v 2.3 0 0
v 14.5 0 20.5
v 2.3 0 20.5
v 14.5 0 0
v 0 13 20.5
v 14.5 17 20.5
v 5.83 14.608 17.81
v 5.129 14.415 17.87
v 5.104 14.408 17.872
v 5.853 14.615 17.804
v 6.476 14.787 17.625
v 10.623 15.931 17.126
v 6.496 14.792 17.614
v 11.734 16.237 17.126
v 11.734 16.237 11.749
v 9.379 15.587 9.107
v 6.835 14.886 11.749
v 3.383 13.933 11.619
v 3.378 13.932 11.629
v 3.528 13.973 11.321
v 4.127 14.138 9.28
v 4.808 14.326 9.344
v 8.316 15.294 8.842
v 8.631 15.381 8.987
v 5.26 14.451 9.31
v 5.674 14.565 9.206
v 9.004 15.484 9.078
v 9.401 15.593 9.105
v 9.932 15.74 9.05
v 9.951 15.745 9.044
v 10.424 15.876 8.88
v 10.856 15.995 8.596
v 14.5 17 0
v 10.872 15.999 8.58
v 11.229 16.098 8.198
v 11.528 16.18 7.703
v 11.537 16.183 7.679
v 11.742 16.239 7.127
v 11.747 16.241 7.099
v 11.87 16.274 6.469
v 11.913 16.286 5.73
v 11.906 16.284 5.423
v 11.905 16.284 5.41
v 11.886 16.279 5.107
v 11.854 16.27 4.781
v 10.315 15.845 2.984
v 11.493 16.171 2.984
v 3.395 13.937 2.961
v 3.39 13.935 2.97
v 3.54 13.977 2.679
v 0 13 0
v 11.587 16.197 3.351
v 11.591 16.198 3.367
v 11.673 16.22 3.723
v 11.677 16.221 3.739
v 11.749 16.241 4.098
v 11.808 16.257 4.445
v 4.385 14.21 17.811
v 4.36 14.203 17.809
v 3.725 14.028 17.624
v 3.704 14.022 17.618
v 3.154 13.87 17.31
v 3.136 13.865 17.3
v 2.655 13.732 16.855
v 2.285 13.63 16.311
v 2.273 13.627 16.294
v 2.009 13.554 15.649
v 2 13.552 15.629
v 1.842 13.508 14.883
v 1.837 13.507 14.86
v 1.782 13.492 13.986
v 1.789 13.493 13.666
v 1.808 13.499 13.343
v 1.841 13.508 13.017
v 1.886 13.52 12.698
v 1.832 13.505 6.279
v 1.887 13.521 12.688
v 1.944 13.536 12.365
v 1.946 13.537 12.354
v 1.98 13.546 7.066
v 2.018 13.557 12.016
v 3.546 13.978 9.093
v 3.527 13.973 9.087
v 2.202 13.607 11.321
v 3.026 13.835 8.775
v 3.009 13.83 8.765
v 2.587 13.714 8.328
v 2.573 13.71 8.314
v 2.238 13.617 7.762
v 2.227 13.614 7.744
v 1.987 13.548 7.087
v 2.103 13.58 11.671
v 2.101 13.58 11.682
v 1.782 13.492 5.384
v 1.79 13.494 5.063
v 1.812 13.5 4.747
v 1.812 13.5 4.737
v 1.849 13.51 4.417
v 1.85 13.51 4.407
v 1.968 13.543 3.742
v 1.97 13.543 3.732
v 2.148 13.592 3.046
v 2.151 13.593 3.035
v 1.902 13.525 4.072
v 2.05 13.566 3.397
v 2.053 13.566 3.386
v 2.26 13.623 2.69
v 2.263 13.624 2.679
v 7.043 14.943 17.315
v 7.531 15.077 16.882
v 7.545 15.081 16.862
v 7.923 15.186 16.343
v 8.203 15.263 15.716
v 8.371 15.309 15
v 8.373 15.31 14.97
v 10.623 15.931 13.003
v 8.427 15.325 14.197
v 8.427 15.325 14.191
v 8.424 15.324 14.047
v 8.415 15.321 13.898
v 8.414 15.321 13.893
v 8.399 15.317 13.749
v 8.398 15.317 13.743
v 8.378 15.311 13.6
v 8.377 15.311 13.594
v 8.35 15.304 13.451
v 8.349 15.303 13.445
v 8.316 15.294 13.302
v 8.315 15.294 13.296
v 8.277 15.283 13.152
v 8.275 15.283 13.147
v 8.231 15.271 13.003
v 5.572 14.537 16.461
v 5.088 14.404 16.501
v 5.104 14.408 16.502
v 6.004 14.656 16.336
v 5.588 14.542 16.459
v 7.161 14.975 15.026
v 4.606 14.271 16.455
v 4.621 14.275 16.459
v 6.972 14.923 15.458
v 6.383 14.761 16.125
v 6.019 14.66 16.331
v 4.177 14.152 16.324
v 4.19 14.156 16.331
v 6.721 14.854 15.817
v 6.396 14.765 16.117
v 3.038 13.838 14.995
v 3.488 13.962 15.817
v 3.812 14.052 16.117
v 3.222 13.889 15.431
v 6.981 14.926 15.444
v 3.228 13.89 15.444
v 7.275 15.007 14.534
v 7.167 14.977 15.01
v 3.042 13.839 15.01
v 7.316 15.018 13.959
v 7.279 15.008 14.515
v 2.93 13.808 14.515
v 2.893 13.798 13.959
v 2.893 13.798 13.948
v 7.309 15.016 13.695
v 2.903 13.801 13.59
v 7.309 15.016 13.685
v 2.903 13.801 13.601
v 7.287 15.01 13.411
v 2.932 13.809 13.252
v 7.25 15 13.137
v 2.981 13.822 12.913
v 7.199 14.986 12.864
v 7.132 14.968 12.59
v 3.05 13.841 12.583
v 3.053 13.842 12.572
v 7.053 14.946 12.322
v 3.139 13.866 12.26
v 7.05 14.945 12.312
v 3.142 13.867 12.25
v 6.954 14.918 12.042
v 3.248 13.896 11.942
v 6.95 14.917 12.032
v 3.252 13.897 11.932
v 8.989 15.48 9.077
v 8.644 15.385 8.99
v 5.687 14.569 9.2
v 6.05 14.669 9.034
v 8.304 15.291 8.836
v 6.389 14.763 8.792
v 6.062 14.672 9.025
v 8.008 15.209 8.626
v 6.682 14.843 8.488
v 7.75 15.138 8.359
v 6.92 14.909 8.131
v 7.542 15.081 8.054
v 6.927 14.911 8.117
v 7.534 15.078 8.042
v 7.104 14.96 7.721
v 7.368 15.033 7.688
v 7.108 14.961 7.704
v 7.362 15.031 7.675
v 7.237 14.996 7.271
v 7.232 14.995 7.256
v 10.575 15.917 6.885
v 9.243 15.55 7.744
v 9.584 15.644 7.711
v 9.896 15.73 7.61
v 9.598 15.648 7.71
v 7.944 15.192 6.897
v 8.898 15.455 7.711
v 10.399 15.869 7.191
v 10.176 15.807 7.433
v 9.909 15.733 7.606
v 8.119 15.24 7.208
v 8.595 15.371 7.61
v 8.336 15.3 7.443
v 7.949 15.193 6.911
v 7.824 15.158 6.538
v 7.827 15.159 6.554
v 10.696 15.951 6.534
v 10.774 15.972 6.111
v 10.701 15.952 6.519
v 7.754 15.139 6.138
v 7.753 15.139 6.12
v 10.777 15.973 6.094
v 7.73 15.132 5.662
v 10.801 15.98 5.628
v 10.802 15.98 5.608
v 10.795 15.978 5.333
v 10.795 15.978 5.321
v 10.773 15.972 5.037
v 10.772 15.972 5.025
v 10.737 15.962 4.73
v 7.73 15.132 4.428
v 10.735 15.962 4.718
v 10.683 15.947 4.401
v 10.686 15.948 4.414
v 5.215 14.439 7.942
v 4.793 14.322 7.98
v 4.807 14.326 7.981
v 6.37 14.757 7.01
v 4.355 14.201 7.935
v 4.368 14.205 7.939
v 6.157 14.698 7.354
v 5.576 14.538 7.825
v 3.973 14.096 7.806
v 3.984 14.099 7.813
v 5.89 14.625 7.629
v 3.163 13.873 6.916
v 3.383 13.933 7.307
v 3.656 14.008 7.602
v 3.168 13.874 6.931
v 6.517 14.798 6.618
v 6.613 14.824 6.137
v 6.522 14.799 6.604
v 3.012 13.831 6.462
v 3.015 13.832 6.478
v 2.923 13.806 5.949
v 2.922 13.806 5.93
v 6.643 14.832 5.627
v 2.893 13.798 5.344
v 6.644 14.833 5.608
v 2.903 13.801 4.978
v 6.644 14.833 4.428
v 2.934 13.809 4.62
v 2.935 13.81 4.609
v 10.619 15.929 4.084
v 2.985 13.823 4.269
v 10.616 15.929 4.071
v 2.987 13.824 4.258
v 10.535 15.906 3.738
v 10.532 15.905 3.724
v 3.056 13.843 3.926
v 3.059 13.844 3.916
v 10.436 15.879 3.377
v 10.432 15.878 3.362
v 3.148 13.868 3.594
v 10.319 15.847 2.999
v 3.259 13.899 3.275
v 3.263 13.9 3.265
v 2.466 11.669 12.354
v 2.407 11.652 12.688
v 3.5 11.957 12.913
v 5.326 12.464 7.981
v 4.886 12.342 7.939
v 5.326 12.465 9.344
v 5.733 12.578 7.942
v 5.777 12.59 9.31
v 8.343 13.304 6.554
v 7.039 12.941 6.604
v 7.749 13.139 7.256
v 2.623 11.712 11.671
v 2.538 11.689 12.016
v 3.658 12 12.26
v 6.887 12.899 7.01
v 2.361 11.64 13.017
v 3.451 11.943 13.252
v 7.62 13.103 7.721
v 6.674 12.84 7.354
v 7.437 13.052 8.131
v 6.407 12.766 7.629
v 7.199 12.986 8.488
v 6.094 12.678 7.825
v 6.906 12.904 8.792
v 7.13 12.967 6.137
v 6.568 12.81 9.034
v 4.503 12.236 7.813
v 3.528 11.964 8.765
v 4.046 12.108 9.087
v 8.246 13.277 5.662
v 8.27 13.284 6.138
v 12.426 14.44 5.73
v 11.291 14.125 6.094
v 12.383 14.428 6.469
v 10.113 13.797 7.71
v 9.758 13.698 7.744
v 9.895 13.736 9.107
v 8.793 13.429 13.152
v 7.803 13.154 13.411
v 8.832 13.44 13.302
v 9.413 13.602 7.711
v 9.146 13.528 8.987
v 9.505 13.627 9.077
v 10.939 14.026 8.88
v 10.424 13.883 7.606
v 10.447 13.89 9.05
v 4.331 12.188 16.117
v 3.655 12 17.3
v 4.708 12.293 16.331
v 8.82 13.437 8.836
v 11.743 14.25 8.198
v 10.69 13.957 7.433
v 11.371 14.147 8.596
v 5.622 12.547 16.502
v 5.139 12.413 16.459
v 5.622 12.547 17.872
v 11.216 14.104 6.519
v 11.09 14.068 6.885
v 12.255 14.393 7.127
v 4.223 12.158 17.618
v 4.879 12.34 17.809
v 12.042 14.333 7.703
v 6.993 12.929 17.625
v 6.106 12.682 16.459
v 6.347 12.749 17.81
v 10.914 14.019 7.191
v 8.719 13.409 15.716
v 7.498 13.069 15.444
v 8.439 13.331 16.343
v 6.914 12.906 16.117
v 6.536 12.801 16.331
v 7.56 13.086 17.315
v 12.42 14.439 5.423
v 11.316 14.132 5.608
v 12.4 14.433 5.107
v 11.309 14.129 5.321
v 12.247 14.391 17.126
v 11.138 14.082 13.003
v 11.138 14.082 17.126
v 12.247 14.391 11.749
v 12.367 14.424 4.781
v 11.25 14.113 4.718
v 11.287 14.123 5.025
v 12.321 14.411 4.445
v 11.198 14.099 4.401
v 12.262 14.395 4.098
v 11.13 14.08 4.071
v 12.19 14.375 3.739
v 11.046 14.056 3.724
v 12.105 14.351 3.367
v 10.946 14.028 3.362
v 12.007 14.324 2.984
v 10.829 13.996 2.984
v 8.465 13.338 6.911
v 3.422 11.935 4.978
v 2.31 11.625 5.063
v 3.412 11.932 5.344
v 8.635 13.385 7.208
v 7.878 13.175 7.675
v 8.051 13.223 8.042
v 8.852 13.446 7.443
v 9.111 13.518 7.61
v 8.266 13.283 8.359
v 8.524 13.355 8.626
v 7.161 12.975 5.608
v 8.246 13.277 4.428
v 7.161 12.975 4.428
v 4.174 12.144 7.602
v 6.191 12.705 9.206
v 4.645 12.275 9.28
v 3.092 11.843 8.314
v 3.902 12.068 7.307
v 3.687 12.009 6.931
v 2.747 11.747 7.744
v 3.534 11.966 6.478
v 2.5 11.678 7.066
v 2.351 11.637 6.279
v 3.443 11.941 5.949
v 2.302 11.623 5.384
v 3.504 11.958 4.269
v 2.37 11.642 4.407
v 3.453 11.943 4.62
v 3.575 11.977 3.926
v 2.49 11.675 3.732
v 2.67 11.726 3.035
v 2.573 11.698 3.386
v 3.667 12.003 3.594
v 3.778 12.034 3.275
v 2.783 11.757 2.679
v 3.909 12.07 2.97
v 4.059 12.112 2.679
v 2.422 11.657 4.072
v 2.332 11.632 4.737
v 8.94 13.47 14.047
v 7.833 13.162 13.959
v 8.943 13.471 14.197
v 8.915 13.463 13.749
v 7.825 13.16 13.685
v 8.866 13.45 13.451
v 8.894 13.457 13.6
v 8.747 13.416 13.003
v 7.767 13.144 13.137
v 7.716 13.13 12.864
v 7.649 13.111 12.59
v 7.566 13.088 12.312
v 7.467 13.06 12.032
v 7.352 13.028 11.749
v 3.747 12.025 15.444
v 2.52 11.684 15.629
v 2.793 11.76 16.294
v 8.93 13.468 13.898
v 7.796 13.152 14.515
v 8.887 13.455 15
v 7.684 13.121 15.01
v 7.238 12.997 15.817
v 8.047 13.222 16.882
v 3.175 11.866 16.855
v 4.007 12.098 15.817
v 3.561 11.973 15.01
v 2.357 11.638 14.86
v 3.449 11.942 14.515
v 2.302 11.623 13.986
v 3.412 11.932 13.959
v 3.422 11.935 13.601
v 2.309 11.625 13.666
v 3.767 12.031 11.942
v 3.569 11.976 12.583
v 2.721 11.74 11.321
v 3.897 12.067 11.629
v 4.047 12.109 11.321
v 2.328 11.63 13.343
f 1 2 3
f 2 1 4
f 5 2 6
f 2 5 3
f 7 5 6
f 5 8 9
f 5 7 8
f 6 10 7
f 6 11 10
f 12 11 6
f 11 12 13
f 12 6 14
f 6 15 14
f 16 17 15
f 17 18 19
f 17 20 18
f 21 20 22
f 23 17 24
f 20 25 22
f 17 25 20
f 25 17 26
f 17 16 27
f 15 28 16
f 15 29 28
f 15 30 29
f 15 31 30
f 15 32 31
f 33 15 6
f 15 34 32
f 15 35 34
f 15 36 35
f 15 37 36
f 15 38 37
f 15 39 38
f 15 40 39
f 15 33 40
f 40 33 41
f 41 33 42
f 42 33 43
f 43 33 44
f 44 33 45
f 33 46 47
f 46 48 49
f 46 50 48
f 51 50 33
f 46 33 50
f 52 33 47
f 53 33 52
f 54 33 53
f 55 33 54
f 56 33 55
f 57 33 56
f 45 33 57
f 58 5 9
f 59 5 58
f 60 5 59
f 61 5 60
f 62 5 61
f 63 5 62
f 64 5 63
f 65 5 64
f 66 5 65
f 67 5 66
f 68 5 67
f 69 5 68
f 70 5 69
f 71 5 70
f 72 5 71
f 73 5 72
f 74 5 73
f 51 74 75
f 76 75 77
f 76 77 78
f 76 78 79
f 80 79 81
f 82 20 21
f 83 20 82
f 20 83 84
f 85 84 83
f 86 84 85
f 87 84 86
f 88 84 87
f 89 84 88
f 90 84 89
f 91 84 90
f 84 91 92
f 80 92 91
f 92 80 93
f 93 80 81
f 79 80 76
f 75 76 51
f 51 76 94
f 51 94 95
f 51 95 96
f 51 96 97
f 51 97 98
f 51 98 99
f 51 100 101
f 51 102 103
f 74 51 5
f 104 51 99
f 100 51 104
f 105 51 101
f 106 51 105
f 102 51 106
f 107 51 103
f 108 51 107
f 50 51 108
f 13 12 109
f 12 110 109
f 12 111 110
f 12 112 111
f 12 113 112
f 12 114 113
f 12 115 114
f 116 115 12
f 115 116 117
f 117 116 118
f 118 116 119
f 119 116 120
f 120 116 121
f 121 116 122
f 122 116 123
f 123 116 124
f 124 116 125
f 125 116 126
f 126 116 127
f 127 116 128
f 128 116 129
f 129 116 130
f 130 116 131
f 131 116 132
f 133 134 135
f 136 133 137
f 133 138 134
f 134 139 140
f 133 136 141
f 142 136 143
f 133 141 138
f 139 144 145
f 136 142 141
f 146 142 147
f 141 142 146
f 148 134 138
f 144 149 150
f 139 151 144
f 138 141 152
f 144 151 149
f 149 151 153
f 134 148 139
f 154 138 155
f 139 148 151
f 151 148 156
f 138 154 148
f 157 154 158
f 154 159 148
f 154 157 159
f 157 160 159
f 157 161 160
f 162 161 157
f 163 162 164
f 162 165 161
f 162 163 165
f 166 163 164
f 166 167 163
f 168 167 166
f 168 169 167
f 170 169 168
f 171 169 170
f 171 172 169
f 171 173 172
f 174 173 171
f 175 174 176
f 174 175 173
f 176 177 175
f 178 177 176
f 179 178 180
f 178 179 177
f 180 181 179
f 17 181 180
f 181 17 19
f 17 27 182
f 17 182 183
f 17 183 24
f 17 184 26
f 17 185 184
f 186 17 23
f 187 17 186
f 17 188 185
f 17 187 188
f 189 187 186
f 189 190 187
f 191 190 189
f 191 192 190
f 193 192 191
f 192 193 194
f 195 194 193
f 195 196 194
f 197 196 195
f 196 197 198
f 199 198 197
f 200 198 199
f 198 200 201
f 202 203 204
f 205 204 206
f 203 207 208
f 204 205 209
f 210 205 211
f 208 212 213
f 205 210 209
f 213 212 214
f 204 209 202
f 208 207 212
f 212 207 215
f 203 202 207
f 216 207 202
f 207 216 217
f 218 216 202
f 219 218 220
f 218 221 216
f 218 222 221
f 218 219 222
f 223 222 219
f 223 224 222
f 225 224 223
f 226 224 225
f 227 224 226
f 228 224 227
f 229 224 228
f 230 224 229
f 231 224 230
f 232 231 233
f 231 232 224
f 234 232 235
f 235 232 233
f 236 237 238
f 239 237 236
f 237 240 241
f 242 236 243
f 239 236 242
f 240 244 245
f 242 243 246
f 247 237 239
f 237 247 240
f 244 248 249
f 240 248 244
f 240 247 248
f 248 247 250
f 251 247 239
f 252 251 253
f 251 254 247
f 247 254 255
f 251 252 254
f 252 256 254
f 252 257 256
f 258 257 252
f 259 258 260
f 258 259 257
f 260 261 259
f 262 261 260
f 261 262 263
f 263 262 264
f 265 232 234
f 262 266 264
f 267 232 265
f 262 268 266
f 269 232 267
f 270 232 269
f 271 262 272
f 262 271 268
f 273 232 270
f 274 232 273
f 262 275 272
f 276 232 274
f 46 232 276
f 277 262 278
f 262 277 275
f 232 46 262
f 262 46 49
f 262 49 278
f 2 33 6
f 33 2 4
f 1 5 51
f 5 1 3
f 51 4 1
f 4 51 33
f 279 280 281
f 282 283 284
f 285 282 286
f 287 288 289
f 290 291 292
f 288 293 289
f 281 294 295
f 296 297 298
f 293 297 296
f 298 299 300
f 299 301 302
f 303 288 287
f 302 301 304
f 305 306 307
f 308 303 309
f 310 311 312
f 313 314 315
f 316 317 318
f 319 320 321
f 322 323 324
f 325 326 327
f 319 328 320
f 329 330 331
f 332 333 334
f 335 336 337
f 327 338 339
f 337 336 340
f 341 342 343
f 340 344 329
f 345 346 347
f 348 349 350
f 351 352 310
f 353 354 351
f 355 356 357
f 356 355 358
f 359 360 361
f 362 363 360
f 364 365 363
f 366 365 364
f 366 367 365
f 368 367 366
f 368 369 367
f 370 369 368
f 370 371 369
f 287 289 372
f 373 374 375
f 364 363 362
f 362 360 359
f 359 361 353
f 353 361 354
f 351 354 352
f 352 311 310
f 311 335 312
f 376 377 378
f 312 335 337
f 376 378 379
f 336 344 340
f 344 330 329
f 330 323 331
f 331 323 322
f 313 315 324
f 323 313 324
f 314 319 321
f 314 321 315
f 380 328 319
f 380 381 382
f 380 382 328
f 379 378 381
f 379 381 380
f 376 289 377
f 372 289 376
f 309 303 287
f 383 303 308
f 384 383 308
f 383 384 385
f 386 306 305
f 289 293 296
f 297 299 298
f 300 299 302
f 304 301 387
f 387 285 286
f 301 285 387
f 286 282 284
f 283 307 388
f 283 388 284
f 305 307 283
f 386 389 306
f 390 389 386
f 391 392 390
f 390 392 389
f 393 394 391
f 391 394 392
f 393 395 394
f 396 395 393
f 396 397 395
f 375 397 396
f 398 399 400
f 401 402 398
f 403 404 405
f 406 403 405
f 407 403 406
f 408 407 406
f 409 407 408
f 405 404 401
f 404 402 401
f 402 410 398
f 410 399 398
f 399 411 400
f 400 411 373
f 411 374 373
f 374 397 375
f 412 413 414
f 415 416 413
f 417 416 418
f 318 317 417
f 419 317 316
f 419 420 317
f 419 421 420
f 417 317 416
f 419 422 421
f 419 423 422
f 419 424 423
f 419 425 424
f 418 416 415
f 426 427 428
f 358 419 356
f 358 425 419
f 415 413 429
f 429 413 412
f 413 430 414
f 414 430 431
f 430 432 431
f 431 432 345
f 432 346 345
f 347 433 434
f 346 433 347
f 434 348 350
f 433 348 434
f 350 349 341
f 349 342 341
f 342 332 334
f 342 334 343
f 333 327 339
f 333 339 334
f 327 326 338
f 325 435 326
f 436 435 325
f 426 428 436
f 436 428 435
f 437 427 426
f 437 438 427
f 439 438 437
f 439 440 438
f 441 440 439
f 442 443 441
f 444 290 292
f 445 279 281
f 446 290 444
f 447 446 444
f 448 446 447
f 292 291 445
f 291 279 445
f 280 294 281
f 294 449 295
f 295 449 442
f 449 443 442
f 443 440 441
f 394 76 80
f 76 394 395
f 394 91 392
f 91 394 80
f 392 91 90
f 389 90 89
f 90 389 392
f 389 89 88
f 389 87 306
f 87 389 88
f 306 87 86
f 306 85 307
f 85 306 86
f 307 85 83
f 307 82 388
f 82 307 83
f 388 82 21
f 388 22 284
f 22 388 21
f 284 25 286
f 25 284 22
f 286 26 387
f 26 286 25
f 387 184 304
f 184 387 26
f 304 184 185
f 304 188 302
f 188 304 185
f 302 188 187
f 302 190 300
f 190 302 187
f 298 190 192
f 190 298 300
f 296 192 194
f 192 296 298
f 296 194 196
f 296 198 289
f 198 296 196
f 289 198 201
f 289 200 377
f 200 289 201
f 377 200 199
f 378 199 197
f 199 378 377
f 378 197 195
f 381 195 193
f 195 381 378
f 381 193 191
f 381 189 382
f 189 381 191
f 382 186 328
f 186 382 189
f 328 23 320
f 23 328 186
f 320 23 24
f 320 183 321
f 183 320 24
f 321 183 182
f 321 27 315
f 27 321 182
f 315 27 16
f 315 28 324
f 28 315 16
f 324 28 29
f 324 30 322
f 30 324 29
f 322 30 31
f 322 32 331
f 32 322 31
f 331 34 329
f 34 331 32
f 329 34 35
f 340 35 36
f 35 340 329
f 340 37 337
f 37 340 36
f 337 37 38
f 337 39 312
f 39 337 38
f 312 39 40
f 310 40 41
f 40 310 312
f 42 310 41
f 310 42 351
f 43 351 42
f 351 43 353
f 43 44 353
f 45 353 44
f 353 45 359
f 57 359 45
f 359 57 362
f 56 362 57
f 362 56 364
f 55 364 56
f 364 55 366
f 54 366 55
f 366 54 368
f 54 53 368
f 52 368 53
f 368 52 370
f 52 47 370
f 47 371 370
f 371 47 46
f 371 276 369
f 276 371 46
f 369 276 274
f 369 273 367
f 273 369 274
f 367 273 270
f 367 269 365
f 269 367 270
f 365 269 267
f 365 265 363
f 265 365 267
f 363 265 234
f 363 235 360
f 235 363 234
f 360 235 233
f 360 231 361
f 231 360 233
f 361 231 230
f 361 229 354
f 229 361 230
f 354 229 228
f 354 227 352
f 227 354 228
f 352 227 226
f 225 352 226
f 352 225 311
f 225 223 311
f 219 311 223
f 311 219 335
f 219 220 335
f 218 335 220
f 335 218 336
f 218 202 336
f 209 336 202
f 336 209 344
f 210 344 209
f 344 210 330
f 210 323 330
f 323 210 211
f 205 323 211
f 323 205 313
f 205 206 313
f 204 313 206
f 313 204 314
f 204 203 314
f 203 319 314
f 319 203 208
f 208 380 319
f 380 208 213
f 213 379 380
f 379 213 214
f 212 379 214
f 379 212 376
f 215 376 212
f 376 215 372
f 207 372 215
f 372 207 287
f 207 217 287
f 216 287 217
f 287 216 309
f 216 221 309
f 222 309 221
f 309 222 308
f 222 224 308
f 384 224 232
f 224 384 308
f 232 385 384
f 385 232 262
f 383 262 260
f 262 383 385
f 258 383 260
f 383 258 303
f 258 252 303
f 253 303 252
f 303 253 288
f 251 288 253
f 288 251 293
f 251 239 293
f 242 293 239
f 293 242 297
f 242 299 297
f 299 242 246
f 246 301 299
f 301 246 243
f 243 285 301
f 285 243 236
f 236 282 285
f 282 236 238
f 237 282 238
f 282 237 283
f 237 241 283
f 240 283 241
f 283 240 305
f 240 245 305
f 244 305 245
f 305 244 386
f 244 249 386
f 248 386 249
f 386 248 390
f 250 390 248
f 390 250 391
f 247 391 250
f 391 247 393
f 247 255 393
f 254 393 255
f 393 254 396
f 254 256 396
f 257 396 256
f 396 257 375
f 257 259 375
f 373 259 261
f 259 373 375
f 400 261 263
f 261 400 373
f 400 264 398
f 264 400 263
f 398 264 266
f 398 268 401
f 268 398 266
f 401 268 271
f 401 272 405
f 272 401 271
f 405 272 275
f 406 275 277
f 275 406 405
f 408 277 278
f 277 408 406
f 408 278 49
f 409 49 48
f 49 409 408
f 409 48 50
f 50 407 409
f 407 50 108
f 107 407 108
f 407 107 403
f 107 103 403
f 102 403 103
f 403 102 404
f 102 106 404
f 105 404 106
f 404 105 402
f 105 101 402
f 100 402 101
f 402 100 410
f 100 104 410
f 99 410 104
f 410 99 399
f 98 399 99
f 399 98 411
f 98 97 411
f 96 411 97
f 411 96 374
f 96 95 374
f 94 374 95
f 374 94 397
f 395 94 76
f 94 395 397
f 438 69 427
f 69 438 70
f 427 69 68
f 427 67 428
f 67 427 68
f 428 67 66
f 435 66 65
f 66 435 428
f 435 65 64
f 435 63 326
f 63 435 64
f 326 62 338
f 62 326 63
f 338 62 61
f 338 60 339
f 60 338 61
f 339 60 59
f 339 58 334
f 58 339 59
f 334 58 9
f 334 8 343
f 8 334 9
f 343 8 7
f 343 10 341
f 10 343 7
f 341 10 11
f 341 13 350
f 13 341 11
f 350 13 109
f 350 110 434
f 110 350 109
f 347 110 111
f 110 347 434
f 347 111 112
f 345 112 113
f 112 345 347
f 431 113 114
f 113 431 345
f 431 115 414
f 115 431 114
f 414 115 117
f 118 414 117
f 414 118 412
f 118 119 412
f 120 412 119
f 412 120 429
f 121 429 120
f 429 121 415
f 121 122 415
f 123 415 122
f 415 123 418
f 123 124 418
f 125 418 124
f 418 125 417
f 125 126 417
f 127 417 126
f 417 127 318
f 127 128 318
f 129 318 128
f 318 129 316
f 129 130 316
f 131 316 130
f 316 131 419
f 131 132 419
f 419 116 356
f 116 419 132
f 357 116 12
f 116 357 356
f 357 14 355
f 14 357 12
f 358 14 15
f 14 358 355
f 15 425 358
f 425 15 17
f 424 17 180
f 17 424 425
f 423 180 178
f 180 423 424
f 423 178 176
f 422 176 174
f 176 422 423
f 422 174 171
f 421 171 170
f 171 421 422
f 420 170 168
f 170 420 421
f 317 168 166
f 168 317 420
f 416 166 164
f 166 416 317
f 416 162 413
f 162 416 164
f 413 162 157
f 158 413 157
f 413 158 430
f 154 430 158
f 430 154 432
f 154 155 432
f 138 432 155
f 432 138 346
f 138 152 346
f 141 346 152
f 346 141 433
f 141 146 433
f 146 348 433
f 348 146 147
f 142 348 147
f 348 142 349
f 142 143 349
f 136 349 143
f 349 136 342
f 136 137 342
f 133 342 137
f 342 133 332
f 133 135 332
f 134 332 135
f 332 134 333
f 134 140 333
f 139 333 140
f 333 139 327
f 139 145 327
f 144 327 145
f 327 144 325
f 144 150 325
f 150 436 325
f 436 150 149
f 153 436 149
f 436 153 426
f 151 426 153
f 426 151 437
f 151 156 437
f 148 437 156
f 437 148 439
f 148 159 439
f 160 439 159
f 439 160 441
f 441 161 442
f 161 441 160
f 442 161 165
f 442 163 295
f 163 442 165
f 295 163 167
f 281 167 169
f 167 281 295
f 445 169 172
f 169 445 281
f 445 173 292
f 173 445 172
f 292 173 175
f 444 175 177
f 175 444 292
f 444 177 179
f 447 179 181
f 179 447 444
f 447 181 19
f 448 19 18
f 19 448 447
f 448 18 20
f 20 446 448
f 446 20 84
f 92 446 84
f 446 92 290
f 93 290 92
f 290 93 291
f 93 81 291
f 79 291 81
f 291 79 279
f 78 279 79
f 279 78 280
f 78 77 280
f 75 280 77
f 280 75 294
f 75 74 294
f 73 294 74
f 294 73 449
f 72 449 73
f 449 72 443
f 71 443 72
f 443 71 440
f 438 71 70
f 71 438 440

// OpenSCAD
// false if to use custom sizes
use_predefined_lbs = false;
// text label and predefines variables (available: 35)
lbs = 35;
// width of the grove in the bow-arm where the body rests
height = 20.5;
// arm length up to screw on the inner side
depth_1 = 13.0;
// body length up to screw on the inner side
depth_2 = 17.0;
// visible screw length between arm and body
width_1 = 12.2;
// longest distance between bow-arm and body
width_2 = 14.5;
// font size of the lbs text (more lbs = lower number)
text_size = 10;
// change if text is not visible (more lbs = lower number)
text_angle = 15.55;

if(use_predefined_lbs) {
    wedge();
} else {
    wedge(
        height,
        depth_1,
        width_1,
        depth_2,
        width_2,
        text_size,
        text_angle
    );
}

module wedge(
    height = getValue("height", measurements),
    depth_1 = getValue("depth_1", measurements),
    width_1 = getValue("width_1", measurements),
    depth_2 = getValue("depth_2", measurements),
    width_2 = getValue("width_2", measurements),
    text_size = getValue("text_size", measurements),
    text_angle = getValue("text_angle", measurements)
 ) {
    difference() {
        hull() {
            hull_ratio = 0.99999;
            translate([width_2 - width_1, 0, 0]) {
                cube([width_1, depth_1, height]);
            }
            cube_1_touchpoint_diff = depth_1 * hull_ratio;
            cube_1_touchpoint = depth_1 - cube_1_touchpoint_diff;
            translate([0, cube_1_touchpoint_diff, 0]) {
                cube([width_1, cube_1_touchpoint, height]);
            }
            cube_2_touchpoint_diff = width_2 * hull_ratio;
            cube_2_touchpoint = width_2 - cube_2_touchpoint_diff;
            translate([cube_2_touchpoint_diff, 0, 0]) {
                cube([cube_2_touchpoint, depth_2, height]);
            }
        }
        translate([width_2/2,depth_1,height/2]) {
            rotate([text_angle,-90,-90]) {
                linear_extrude(2) {
                    text(
                        str(lbs),
                        font = "Roboto:style=Black",
                        size = text_size,
                        halign = "center",
                        valign = "center"
                    );
                }
            }
        }
    }
}

function getValue(key, map) = map[getTuple(getKey(key),map)][1];

function getTuple(key, map) = search([key],map)[0];

function getKey(key) = str(lbs,"_",key);

measurements = [
    ["35_height", 20.5],
    ["35_depth_1", 13.0],
    ["35_width_1", 12.2],
    ["35_depth_2", 17.0],
    ["35_width_2", 14.5],
    ["35_text_size", 10],
    ["35_text_angle", 15.55]
];
